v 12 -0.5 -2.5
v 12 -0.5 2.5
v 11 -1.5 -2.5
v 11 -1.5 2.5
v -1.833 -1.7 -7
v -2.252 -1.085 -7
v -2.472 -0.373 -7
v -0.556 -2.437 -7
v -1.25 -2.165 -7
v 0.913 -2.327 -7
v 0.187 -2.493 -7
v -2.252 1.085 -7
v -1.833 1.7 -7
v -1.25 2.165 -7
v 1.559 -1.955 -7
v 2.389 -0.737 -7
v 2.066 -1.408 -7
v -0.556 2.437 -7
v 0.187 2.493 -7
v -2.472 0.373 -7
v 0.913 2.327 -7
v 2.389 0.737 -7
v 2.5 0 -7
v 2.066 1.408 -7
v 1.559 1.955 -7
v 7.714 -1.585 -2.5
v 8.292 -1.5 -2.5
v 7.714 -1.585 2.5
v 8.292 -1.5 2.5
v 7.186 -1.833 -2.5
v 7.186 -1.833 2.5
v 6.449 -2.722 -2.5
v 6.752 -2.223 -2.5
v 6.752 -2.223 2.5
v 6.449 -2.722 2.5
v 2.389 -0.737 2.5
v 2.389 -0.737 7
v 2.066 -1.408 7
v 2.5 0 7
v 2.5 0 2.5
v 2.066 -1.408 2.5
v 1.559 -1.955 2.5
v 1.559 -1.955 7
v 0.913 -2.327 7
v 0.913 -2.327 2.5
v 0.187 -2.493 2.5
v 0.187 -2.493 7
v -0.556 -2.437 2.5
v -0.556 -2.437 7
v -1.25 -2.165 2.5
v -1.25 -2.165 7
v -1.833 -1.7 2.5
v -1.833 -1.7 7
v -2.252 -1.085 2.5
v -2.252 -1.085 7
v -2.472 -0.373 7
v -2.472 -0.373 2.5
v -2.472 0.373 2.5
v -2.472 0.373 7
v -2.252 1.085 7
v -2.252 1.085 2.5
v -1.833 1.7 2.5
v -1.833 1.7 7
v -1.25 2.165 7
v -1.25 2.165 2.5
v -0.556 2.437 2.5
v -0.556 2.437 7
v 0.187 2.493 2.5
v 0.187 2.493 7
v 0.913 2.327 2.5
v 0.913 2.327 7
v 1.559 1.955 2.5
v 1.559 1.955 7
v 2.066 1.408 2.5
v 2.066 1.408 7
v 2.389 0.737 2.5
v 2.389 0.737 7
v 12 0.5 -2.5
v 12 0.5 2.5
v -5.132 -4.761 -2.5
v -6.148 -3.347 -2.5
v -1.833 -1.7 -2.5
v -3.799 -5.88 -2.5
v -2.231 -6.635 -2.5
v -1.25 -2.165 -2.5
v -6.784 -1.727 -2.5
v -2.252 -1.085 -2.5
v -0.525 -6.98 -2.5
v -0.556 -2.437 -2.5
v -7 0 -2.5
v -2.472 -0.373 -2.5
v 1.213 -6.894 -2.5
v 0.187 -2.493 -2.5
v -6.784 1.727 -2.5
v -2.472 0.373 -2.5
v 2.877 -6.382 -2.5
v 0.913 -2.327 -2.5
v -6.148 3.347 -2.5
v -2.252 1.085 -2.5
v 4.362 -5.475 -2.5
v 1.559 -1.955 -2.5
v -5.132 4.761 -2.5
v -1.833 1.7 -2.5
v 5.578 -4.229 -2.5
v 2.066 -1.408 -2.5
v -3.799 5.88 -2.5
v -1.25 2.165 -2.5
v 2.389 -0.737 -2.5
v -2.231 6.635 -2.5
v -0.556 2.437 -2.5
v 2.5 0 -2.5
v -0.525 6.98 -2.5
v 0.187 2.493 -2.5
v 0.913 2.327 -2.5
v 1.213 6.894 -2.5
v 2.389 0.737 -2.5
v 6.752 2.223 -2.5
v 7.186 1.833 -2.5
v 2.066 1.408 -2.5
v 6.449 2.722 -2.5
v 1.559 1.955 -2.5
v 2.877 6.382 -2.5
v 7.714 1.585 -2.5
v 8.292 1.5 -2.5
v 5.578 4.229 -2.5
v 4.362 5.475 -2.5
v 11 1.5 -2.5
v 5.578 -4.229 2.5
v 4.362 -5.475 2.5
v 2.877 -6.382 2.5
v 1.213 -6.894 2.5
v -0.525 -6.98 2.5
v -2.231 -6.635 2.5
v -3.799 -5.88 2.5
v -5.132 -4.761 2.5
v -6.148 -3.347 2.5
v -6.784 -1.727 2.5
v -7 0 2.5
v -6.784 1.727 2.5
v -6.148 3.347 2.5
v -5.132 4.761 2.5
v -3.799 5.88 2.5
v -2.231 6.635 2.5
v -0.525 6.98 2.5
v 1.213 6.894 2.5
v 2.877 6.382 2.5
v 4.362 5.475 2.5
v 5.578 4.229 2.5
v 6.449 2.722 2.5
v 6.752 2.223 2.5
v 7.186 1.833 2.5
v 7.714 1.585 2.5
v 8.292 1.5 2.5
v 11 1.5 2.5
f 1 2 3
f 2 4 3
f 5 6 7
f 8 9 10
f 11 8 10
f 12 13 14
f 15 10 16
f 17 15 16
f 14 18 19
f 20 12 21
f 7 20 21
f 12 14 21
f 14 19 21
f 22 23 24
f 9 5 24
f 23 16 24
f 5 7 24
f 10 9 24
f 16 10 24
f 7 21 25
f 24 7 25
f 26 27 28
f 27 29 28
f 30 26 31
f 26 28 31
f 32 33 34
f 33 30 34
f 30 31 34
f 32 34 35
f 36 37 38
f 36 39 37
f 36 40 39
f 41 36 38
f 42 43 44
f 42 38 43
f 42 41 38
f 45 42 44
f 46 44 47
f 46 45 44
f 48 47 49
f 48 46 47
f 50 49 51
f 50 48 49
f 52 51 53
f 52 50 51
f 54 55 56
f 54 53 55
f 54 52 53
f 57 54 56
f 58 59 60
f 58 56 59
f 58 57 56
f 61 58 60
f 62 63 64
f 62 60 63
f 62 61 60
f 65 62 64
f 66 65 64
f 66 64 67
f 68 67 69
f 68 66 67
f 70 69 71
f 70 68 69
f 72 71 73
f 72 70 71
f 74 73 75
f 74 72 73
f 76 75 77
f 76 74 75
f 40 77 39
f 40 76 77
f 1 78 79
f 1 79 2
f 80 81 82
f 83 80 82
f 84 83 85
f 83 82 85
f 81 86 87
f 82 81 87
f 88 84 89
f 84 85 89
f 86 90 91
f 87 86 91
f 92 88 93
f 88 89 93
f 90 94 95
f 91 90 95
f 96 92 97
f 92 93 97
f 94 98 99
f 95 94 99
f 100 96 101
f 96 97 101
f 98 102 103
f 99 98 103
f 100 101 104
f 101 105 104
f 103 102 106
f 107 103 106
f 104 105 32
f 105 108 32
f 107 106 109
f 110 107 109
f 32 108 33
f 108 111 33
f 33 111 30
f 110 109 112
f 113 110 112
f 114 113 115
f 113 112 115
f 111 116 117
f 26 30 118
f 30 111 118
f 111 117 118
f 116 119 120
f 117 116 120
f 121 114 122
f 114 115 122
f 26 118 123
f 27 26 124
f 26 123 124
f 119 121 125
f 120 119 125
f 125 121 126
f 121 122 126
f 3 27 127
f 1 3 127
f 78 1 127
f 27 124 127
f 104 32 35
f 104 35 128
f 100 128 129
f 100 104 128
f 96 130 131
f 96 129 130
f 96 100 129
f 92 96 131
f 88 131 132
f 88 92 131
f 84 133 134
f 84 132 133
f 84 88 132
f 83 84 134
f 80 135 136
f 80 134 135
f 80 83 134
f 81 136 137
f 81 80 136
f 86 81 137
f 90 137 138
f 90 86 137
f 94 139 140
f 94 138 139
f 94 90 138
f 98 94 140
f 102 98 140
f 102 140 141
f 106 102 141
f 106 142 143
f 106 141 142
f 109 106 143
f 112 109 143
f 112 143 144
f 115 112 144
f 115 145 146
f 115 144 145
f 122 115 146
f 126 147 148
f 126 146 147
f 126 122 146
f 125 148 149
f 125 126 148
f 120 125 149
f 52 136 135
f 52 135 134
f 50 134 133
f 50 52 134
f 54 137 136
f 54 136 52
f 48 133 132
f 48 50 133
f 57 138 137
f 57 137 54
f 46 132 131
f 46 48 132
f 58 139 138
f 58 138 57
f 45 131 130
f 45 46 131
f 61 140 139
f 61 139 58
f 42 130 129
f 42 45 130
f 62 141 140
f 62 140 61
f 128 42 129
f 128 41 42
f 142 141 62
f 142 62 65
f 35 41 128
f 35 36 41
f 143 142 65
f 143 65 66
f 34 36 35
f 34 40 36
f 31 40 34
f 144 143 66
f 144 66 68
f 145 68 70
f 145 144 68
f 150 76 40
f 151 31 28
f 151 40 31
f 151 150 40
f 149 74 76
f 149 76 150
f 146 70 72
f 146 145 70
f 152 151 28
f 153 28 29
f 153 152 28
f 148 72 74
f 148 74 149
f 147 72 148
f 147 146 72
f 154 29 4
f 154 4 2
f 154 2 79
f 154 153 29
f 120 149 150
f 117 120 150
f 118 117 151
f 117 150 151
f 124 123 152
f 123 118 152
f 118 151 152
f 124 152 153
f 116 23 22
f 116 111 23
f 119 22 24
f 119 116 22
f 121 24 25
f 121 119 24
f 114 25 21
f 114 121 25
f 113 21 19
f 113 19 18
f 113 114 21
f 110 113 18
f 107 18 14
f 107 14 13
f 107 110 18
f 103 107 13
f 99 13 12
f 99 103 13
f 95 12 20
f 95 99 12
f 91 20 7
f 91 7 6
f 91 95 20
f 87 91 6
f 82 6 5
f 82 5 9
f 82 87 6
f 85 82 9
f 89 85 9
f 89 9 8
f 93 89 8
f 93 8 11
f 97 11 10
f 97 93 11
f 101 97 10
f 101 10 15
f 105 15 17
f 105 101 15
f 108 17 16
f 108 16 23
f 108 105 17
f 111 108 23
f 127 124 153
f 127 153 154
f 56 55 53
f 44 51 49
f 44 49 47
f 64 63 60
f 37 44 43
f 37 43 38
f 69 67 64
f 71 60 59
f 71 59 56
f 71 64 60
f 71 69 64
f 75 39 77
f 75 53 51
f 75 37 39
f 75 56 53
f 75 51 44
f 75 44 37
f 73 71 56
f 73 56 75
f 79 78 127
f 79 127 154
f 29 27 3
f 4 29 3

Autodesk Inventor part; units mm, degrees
ref_plane "YZ Plane" through (0, 0, 0) normal (1, 0, 0) x (0, 1, 0)
ref_plane "XZ Plane" through (0, 0, 0) normal (0, 1, 0) x (-1, 0, 0)
ref_plane "XY Plane" through (0, 0, 0) normal (0, 0, 1) x (1, 0, 0)
sketch "스케치1" plane through (0, 0, 0) normal (0, 0, 1) x (1, 0, 0)
  circle A0 centre (0, 0) radius 2.5
  arc A1 (6.8374, 1.5) -> (6.8374, -1.5) centre (0, 0) ccw
  line L0 (6.8374, 1.5) -> (12, 1.5)
  line L1 (6.8374, -1.5) -> (12, -1.5)
  line L2 (12, 1.5) -> (12, -1.5)
  dimension "d0" = 5
  dimension "d1" = 14
  dimension "d2" = 3
  dimension "d3" = 1.5
  dimension "d4" = 12
extrude "돌출1" add sketch "스케치1" along normal mid plane 5
extrude "돌출2" add sketch "스케치1" along normal mid plane 14 contours A0
chamfer "모따기1" distance 1 angle 45 2 edges at (12, 1.5, 0) (12, -1.5, 0)
fillet "모깎기1" radius 2 2 edges at (6.8374, 1.5, 0) (6.8374, -1.5, 0)
properties part number "2번부품"
